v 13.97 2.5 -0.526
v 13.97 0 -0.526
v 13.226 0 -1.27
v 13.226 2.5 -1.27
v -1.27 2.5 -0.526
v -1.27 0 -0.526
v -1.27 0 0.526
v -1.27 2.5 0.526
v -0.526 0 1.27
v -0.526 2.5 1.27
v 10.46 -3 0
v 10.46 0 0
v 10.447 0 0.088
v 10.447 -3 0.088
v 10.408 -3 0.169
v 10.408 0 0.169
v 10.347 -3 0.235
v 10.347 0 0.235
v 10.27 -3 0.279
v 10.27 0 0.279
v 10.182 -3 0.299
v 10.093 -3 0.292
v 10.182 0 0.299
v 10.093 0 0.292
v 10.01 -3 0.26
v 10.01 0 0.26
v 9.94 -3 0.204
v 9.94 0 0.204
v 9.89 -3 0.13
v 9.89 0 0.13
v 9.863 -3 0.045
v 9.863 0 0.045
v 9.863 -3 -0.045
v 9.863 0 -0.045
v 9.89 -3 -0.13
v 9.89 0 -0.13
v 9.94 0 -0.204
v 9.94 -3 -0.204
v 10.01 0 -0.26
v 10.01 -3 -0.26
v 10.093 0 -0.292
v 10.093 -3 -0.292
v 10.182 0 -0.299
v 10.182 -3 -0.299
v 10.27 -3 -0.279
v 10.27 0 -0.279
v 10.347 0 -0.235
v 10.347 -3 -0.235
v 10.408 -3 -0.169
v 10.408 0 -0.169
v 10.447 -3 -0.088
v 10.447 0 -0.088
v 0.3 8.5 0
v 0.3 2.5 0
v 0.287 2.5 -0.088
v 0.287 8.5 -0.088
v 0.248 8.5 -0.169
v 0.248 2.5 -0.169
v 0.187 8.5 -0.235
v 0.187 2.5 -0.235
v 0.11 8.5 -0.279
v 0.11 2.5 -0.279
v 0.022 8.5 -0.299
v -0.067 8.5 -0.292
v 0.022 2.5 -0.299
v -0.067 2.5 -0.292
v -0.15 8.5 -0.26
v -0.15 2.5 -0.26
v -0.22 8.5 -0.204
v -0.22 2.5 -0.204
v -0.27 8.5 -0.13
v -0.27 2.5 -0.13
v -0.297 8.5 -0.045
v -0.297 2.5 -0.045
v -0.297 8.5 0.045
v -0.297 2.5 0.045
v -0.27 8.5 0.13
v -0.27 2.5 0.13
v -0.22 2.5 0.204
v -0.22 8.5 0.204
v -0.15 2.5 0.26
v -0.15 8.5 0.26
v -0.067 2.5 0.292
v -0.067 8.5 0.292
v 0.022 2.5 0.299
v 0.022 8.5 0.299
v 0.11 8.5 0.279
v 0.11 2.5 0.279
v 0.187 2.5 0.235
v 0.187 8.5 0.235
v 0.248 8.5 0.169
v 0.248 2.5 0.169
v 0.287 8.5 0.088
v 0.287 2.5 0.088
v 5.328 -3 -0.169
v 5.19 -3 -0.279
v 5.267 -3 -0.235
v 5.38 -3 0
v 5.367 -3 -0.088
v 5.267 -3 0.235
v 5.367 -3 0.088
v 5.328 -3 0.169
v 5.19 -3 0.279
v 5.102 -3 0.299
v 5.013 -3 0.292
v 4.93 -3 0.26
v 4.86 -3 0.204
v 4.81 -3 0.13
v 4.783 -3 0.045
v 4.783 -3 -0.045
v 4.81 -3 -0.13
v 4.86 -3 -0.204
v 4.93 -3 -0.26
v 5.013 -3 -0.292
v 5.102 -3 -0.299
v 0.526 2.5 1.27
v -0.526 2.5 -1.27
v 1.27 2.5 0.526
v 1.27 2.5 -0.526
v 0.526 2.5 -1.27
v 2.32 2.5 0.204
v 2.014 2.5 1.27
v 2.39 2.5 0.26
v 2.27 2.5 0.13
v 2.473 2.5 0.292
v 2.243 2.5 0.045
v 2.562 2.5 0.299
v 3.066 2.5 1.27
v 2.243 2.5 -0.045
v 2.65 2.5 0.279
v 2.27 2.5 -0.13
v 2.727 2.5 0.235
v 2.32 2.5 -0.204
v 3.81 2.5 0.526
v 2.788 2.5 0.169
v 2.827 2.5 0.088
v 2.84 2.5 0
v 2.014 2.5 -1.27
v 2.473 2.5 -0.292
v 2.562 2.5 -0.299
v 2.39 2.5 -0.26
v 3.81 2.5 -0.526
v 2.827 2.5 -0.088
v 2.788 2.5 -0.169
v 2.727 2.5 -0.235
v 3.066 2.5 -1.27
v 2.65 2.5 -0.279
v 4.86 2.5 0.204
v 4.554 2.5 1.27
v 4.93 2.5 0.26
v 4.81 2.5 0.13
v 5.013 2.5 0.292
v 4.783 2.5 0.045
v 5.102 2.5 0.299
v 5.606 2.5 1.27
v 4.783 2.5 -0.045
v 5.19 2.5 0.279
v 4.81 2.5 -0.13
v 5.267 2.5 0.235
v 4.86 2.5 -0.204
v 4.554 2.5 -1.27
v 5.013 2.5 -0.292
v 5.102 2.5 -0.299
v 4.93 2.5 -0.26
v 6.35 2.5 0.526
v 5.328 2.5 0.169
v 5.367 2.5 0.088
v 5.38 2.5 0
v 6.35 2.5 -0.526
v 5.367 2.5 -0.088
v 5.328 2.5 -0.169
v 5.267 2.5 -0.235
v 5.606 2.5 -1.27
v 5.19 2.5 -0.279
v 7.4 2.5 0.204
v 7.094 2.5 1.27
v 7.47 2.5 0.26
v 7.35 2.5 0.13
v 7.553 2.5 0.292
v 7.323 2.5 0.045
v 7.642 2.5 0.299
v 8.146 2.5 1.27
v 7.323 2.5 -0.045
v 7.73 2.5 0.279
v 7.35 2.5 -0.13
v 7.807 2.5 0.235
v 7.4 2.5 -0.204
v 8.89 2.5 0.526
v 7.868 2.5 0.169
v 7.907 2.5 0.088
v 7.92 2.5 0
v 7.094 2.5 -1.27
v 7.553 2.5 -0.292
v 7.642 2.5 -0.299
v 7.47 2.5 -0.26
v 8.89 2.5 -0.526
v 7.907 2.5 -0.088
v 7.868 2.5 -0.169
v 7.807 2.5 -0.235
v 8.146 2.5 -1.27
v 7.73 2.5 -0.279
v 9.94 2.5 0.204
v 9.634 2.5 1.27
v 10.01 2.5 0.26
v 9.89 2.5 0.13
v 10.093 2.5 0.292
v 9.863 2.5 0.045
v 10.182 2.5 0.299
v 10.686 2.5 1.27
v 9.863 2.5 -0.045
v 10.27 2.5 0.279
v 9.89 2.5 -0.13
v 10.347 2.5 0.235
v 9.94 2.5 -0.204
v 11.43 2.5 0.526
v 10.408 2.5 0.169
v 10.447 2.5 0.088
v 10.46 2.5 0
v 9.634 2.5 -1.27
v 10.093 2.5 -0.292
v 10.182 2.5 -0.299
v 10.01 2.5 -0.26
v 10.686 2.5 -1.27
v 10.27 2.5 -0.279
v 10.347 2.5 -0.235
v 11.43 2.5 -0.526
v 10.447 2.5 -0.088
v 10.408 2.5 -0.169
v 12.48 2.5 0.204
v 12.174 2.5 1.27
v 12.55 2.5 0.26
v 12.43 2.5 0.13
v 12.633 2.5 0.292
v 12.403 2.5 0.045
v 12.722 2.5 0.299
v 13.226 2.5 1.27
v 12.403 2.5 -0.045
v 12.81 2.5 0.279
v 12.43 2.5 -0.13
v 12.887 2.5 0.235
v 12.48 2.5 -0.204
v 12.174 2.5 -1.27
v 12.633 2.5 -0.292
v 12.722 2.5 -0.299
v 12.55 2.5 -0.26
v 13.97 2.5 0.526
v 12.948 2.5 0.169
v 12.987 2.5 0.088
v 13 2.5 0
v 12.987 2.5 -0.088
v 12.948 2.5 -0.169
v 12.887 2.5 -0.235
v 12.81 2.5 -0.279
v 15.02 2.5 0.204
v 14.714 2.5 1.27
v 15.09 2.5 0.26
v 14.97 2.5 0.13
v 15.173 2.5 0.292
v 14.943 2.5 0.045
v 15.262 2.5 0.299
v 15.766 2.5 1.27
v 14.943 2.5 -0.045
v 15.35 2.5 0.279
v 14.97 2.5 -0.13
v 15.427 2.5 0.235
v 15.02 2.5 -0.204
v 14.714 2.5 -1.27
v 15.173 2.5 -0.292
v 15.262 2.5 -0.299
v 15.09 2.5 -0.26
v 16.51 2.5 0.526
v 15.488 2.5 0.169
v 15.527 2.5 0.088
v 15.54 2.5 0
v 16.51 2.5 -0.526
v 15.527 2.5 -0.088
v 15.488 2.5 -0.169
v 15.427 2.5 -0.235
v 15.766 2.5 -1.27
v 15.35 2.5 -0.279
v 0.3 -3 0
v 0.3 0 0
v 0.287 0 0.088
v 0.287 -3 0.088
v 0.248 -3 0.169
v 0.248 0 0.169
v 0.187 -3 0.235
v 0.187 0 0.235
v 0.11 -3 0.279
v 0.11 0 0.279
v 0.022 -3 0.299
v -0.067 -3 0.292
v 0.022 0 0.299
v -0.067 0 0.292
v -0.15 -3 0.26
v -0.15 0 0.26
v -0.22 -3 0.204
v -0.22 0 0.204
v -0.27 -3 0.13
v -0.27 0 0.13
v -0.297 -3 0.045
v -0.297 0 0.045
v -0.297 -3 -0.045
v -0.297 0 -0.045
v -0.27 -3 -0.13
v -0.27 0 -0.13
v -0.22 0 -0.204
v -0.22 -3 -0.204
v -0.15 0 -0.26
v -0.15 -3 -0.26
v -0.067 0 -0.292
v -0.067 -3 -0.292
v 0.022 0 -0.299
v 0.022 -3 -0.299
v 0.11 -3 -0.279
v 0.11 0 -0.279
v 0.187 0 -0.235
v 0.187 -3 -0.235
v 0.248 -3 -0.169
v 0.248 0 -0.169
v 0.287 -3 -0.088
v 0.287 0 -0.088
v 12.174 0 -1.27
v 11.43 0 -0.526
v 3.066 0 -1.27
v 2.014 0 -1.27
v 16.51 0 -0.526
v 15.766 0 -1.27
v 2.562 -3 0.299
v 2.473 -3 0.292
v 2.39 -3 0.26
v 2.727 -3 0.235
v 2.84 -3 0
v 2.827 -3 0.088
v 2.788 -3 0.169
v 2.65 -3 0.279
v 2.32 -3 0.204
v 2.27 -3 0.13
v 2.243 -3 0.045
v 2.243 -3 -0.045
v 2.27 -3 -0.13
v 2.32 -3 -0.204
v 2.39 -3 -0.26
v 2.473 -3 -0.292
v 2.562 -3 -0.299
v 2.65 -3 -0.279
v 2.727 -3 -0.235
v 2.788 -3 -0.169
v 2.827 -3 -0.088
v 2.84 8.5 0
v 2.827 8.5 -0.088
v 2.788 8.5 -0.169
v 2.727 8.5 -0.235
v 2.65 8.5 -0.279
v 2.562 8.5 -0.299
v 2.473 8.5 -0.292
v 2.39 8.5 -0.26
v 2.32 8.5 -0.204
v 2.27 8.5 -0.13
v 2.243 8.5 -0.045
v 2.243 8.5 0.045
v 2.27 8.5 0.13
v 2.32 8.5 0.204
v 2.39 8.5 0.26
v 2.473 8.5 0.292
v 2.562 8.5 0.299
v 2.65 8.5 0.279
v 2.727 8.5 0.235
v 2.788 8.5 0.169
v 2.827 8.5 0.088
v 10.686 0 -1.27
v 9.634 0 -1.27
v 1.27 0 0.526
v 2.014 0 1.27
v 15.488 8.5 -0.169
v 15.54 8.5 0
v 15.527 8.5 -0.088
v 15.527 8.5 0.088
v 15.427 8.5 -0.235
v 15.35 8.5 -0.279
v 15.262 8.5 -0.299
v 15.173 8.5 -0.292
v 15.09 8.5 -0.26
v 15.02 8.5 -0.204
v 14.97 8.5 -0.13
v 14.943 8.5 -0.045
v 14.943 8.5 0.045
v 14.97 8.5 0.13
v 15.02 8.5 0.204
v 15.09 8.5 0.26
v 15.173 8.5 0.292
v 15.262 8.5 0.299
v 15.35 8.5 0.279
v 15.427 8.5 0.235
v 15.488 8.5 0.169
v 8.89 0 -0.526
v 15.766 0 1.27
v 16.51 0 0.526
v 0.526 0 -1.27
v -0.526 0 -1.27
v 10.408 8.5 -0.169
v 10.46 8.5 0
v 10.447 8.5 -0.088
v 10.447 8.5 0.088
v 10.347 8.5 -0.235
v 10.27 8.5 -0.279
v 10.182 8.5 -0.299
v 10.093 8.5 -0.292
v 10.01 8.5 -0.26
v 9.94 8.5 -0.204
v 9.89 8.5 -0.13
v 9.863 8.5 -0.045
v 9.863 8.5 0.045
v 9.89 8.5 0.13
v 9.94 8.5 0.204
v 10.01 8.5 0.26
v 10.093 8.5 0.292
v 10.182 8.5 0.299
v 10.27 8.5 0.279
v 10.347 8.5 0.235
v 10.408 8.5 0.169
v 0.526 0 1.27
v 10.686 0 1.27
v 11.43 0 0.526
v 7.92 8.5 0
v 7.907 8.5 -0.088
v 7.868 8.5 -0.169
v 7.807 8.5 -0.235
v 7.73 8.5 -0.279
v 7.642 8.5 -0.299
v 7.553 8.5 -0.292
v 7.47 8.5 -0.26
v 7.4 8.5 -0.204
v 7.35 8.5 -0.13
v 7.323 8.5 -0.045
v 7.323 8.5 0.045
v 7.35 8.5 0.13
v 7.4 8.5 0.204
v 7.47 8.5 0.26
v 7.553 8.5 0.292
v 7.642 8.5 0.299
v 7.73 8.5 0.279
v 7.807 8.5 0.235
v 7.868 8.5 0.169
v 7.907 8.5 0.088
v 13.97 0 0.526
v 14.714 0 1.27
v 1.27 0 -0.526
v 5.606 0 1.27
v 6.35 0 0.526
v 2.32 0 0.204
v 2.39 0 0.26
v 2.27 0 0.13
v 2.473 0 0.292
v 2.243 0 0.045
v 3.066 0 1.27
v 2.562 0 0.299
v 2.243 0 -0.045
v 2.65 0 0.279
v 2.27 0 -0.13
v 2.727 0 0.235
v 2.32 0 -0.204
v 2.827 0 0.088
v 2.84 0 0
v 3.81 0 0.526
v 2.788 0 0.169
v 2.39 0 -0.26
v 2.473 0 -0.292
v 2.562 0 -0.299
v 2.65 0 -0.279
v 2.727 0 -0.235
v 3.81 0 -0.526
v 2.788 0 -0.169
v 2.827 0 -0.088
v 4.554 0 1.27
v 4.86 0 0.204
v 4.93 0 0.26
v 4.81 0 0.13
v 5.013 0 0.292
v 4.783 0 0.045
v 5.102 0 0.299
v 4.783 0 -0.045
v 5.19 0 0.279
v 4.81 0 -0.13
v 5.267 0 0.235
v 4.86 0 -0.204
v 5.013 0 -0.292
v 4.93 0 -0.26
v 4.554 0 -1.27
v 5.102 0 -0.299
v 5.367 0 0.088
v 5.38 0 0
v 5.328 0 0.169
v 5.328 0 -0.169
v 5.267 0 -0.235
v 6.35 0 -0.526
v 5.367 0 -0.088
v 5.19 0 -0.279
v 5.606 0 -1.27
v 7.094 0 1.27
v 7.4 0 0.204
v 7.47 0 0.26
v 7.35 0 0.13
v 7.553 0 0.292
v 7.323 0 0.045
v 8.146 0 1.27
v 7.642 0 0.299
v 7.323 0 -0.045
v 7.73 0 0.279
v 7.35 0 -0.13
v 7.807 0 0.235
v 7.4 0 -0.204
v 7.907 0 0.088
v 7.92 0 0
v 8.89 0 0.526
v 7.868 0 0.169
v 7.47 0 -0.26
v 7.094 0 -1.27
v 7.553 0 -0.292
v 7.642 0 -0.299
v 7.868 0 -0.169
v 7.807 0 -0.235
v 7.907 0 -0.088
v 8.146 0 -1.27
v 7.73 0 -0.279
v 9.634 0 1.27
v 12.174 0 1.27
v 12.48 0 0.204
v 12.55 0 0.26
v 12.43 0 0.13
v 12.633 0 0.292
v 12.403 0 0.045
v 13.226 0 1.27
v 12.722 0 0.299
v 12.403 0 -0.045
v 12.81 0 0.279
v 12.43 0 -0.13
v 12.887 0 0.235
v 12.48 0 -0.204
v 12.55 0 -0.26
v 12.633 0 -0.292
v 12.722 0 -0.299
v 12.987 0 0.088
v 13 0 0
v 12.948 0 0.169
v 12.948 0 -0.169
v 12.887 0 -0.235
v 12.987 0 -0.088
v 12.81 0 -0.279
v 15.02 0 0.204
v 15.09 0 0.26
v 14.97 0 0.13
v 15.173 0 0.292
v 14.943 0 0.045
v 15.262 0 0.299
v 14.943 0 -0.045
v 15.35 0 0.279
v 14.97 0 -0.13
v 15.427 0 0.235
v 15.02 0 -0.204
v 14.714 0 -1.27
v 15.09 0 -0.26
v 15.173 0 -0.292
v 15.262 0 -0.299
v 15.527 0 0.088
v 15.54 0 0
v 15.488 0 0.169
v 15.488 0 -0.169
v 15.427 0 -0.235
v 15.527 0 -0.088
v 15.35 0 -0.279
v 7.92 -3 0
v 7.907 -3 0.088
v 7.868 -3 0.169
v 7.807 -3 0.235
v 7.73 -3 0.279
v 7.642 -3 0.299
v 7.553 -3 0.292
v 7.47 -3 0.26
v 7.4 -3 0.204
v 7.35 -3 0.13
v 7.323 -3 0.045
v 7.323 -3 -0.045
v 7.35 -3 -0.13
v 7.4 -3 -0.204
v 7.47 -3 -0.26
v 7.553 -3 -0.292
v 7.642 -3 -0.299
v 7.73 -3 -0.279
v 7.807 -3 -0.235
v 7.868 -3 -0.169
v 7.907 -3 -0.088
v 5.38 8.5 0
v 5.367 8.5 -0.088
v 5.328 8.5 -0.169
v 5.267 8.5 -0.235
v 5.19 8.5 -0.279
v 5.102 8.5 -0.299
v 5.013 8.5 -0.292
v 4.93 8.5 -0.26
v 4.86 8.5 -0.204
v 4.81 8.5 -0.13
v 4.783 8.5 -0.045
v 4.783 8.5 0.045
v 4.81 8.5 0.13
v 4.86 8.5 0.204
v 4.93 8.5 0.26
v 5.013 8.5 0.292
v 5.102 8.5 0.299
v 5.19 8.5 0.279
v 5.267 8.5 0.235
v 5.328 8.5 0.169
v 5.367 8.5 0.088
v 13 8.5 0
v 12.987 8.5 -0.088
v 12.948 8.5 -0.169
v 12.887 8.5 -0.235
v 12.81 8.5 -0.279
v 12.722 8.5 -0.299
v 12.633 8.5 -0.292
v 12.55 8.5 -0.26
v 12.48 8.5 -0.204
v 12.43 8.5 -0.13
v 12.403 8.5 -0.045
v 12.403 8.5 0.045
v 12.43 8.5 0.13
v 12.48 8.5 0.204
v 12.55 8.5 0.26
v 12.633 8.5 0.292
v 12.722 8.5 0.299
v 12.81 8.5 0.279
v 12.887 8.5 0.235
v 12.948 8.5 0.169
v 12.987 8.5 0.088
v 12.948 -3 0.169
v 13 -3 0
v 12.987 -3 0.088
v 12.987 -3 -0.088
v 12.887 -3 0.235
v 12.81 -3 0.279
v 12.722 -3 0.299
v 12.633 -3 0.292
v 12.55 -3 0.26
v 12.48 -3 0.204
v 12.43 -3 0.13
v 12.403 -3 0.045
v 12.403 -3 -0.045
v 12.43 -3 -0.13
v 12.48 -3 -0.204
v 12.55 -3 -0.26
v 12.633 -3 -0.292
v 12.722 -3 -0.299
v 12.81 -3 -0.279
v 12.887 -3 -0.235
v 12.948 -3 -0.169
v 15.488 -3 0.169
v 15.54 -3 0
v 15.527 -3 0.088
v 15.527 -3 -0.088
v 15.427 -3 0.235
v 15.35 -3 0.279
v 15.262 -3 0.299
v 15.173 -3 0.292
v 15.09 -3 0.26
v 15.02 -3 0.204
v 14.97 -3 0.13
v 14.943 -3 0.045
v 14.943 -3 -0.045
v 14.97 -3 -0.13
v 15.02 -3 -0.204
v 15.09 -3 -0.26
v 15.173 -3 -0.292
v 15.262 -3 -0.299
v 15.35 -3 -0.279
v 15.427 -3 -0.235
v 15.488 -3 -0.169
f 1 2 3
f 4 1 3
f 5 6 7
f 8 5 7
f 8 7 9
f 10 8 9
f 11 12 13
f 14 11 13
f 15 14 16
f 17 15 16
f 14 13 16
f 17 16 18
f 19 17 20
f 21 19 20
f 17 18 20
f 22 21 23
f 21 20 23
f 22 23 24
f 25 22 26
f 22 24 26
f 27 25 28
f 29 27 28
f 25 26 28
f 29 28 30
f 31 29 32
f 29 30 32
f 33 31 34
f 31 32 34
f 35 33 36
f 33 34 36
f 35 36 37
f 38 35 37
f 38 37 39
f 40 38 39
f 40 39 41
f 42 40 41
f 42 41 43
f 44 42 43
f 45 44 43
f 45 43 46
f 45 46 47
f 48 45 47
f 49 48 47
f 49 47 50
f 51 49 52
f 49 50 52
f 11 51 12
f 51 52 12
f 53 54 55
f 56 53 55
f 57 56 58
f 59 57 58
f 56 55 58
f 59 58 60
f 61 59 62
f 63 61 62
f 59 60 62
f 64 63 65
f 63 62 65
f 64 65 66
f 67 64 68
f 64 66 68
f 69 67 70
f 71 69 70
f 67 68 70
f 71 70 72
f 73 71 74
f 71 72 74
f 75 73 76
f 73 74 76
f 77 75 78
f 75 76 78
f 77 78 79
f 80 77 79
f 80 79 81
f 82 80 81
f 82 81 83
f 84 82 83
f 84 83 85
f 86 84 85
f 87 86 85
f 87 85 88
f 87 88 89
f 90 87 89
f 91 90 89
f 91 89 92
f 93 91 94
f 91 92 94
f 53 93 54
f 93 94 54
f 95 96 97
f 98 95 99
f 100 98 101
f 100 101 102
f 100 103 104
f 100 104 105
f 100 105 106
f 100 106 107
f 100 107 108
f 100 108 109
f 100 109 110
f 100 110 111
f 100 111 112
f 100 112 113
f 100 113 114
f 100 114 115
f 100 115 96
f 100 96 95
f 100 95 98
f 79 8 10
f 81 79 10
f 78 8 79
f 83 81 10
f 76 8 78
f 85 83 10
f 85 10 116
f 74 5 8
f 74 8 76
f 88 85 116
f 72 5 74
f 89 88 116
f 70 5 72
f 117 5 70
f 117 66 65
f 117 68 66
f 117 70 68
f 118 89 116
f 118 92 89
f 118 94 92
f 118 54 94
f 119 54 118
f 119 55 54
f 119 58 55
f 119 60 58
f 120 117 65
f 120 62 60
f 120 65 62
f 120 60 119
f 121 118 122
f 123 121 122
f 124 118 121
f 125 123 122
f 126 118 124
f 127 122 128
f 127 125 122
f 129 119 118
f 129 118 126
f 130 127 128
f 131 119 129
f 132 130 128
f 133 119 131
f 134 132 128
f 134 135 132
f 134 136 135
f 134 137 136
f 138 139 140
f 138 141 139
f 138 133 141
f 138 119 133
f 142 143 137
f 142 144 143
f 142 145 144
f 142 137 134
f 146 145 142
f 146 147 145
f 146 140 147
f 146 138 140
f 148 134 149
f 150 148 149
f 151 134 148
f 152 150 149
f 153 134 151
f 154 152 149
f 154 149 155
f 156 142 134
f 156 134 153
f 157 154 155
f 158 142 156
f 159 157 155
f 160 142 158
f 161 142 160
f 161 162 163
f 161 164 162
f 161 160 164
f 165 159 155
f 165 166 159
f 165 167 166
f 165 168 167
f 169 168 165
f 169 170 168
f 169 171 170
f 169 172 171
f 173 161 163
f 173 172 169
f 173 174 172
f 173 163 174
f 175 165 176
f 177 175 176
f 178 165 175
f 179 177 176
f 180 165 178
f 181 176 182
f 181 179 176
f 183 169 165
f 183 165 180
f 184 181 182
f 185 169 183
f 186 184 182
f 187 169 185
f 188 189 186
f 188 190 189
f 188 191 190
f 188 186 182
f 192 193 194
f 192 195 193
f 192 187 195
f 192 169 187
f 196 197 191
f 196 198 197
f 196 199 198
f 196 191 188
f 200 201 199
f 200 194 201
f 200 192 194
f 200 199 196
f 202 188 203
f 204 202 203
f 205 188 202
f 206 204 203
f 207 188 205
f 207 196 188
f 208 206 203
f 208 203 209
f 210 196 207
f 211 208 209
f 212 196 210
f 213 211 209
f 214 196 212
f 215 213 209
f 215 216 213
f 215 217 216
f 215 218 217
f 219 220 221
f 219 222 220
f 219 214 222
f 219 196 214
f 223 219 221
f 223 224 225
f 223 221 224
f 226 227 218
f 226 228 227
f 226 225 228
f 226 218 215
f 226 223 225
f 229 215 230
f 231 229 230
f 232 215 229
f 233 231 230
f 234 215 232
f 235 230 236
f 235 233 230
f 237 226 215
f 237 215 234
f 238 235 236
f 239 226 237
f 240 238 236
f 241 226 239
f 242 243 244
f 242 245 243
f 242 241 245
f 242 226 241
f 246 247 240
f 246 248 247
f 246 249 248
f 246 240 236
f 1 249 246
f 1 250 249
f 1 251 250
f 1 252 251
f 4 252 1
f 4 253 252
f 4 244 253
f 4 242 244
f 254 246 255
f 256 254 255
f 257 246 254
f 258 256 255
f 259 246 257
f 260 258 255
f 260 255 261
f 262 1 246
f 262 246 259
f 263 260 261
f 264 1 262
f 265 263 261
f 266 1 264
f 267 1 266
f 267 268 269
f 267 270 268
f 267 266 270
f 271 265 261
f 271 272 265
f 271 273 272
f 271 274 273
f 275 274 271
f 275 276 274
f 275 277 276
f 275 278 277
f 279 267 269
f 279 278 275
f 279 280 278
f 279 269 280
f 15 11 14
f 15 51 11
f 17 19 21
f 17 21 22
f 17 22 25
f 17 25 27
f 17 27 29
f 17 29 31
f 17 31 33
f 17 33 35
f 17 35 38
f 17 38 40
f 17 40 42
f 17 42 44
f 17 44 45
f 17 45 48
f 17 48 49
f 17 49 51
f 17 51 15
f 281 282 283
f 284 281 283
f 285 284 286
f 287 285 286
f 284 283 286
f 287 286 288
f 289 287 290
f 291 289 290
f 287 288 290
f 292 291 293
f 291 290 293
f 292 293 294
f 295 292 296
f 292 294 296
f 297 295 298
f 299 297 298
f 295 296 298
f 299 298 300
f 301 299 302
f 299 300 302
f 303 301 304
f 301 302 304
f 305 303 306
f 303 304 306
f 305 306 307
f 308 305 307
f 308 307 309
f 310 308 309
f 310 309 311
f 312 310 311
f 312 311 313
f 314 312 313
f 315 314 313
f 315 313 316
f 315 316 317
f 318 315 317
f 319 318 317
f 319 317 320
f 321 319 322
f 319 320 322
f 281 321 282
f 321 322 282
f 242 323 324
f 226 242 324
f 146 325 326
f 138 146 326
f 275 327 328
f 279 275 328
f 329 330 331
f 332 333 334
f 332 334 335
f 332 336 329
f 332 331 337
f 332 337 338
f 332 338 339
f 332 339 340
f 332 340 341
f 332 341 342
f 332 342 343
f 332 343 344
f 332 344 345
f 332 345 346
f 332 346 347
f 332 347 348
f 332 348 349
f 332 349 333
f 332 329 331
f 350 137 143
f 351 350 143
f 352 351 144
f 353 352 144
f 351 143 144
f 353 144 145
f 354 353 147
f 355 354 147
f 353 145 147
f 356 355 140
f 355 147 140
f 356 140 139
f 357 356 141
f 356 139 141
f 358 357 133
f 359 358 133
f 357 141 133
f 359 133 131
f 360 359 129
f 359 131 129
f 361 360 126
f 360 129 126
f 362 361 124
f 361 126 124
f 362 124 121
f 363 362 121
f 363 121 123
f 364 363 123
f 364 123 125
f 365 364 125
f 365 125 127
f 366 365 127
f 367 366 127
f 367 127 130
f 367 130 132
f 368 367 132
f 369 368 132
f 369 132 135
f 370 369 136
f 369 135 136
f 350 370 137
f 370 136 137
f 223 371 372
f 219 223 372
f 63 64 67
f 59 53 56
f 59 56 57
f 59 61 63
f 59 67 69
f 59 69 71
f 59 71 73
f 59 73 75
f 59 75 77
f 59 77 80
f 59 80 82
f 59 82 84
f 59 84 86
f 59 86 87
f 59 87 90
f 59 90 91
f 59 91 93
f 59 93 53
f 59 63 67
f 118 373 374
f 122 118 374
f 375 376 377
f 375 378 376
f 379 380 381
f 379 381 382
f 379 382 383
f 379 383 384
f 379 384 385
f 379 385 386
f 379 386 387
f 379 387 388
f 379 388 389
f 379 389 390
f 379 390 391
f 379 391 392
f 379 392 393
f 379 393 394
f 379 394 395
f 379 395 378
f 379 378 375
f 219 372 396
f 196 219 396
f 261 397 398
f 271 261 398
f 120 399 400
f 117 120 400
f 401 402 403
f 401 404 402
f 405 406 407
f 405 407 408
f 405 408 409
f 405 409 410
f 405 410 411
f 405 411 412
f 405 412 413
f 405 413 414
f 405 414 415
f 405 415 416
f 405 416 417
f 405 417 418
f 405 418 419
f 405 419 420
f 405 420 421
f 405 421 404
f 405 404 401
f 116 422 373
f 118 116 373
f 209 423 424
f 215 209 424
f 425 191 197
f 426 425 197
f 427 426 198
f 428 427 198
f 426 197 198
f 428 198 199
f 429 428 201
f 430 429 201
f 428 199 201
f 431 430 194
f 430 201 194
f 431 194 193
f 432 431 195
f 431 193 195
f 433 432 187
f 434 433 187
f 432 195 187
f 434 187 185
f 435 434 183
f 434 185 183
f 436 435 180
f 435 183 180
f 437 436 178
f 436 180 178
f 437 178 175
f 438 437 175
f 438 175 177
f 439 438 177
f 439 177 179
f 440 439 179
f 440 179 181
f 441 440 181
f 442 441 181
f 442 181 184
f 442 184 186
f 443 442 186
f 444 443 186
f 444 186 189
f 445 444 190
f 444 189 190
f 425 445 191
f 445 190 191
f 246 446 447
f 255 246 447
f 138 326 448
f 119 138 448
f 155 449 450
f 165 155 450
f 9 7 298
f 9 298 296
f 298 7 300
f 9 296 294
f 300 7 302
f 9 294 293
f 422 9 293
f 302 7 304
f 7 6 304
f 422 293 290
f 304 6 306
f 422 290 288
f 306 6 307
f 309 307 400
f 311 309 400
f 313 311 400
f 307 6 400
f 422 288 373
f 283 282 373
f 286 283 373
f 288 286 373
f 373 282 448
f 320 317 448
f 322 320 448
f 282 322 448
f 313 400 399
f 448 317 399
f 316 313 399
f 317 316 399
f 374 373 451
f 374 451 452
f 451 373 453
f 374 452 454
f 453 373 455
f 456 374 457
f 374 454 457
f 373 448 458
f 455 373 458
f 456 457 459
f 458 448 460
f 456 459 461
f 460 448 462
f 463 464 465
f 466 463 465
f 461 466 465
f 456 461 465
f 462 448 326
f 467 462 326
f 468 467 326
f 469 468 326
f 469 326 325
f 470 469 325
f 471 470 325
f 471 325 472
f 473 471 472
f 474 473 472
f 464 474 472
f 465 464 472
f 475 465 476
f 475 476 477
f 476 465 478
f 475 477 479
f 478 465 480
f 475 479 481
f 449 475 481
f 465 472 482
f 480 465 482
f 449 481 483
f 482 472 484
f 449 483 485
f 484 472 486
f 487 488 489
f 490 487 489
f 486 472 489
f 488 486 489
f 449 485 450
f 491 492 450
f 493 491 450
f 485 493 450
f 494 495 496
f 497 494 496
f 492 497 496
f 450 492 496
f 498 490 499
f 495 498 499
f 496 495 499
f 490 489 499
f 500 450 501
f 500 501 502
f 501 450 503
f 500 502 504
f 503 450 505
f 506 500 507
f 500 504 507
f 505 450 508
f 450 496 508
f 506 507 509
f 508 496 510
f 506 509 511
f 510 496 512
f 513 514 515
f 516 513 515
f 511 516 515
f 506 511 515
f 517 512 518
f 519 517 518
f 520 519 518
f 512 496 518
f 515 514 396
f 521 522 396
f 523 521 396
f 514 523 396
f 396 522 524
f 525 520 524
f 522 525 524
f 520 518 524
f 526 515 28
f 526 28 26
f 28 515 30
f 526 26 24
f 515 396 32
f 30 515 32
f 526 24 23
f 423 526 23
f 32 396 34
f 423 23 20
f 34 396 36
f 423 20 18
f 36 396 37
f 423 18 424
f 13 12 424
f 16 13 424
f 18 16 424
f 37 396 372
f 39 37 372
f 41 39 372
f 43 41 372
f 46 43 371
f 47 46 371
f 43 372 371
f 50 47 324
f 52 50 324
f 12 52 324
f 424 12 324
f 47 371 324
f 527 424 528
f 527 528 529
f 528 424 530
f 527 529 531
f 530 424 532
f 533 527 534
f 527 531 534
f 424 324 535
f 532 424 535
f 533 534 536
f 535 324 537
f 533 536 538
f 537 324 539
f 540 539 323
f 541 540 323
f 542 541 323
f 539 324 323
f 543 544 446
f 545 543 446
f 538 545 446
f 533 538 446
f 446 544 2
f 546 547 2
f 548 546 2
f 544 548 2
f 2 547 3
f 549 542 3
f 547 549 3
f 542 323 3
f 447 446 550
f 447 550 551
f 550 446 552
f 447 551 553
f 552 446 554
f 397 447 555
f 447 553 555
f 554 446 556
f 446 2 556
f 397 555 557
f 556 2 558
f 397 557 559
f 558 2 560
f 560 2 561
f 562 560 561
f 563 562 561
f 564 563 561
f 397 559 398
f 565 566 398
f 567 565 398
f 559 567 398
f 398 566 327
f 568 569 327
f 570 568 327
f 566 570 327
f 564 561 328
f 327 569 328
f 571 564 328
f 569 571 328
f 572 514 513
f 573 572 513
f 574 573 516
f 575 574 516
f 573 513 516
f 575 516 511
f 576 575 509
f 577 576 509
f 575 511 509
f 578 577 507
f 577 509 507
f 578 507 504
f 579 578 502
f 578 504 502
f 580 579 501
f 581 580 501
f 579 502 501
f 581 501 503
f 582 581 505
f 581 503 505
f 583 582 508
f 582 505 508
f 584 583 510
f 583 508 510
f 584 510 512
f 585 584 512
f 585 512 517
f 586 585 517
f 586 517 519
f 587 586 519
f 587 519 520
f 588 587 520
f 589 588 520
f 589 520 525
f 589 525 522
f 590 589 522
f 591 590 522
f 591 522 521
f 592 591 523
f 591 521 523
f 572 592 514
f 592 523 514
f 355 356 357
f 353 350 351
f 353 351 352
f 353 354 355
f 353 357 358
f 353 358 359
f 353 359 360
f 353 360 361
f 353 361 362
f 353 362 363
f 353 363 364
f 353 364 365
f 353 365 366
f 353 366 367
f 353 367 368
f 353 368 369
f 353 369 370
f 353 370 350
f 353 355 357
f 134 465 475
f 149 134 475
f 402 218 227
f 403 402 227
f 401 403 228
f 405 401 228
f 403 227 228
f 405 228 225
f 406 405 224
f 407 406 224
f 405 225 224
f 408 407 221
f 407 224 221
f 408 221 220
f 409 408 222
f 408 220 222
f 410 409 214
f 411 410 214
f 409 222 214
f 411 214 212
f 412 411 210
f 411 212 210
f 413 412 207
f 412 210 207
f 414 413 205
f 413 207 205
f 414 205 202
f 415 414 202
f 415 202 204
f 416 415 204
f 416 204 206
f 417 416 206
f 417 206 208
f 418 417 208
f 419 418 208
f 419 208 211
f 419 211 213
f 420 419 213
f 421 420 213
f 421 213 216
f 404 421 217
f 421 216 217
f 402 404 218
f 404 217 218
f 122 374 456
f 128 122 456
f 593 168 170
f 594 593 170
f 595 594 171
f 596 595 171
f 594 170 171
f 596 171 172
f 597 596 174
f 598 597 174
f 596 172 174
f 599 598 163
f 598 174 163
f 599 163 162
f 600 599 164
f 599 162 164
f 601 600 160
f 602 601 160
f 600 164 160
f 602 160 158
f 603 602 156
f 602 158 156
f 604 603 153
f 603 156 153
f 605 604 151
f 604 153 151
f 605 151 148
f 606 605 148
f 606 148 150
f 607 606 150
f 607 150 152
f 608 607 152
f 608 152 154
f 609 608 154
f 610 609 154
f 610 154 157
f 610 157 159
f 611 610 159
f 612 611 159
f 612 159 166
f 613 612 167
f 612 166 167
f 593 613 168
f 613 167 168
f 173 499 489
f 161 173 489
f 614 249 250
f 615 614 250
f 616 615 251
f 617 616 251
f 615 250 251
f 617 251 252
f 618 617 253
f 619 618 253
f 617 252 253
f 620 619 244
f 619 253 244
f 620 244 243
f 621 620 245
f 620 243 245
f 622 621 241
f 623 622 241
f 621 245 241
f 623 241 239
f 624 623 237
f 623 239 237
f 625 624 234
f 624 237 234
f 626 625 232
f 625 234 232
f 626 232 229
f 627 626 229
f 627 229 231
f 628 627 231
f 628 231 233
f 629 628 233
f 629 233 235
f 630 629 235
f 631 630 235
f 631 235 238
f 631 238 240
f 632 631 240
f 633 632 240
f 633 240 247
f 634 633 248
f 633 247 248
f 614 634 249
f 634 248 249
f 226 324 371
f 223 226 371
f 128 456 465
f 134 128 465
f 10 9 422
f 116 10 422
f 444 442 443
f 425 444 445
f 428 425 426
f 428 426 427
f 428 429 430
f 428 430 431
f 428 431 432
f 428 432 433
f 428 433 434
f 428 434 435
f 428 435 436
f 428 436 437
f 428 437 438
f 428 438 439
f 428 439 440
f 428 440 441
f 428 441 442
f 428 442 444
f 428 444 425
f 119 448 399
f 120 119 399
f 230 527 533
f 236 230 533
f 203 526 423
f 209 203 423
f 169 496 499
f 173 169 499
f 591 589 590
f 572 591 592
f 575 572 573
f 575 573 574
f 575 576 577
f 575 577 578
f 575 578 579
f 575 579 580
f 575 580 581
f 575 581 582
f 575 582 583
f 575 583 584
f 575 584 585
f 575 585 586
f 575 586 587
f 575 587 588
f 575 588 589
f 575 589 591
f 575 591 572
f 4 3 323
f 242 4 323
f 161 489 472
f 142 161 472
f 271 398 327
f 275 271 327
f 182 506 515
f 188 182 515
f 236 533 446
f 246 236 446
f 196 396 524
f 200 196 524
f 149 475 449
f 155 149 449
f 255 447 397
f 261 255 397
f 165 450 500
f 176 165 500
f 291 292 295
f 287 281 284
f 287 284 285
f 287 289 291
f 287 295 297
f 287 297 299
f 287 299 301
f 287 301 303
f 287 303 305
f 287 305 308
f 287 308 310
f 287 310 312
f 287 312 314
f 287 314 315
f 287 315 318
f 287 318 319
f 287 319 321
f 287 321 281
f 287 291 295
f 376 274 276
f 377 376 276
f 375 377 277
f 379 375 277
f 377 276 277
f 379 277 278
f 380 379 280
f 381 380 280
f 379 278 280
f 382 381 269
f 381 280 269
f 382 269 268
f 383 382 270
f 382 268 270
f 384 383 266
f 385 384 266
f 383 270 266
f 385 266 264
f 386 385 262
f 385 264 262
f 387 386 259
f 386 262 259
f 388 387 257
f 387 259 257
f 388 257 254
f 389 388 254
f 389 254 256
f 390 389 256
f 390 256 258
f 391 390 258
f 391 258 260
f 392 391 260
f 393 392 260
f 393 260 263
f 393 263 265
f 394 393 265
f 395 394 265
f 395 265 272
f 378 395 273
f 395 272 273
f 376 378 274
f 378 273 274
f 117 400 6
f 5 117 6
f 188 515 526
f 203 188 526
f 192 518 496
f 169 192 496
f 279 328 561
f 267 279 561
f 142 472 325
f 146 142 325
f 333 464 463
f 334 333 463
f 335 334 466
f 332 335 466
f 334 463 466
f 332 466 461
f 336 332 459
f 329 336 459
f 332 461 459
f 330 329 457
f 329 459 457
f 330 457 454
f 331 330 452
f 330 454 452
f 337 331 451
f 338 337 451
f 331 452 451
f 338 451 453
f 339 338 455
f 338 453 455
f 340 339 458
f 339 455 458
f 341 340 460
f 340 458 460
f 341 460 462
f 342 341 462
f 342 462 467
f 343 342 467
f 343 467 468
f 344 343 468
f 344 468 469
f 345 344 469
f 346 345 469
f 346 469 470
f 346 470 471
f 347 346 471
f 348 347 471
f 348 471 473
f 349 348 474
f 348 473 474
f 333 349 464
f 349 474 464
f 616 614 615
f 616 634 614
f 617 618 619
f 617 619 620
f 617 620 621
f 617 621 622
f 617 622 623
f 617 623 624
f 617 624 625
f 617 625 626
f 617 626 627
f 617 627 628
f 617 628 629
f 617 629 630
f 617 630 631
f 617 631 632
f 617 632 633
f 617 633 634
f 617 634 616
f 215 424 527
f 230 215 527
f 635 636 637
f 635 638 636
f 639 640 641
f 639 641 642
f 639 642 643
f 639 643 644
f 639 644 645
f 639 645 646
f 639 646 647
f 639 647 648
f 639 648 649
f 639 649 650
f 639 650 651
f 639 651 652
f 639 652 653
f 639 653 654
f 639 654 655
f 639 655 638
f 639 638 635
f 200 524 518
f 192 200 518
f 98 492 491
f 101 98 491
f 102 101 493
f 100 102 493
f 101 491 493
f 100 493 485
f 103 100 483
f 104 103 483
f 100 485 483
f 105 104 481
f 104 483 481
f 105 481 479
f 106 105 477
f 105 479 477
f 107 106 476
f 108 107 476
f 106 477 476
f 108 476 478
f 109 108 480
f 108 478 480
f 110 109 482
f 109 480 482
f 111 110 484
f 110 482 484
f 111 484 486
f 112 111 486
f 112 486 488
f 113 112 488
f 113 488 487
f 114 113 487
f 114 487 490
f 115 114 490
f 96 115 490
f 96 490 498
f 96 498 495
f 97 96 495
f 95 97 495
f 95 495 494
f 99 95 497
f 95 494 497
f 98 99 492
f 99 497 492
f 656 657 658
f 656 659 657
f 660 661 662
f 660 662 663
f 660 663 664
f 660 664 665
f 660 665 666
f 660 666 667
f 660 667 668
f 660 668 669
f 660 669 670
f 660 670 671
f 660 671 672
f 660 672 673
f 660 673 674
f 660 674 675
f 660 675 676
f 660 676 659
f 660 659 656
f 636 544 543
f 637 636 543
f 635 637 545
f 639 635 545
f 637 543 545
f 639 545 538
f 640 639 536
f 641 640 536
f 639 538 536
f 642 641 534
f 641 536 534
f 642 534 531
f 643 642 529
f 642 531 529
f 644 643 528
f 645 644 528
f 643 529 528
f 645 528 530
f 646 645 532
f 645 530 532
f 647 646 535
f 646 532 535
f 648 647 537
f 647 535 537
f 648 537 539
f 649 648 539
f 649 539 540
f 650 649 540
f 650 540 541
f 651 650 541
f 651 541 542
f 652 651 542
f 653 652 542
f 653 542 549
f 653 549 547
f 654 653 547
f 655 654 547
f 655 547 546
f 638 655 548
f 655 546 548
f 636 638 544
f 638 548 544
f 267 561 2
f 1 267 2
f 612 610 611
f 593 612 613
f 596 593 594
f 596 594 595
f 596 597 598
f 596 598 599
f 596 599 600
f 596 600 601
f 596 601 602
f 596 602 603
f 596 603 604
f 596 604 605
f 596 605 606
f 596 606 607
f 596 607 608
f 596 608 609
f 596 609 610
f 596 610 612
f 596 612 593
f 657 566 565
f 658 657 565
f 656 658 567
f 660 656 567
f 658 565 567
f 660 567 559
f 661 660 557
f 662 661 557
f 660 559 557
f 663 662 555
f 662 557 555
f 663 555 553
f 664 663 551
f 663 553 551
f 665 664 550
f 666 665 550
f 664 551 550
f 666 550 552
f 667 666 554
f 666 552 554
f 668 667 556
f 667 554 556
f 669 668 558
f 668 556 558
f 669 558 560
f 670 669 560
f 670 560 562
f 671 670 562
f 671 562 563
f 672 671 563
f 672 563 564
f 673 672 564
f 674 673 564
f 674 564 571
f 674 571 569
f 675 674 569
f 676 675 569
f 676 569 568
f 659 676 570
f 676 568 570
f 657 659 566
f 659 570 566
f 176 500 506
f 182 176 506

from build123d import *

# Parameters (mm, degrees)
EXTRUDE_1_DEPTH = 2.5
SKETCH_2_R      = 0.3
EXTRUDE_2_DEPTH = 6
SKETCH_3_R      = 0.3
EXTRUDE_3_DEPTH = 3


with BuildPart() as part:
    # Эскиз1 → Бобышка-Вытянуть1 (new body)
    with BuildSketch(Plane(origin=(0, 0, 0), x_dir=(1, 0, 0), z_dir=(0, 1, 0))):
        Polygon((16.51, -0.526051224), (16.51, 0.526051224), (15.766051224, 1.27), (14.713948776, 1.27), (13.97, 0.526051224), (13.226051224, 1.27), (12.173948776, 1.27), (11.43, 0.526051224), (10.686051224, 1.27), (9.633948776, 1.27), (8.89, 0.526051224), (8.146051224, 1.27), (7.093948776, 1.27), (6.35, 0.526051224), (5.606051224, 1.27), (4.553948776, 1.27), (3.81, 0.526051224), (3.066051224, 1.27), (2.013948776, 1.27), (1.27, 0.526051224), (0.526051224, 1.27), (-0.526051224, 1.27), (-1.27, 0.526051224), (-1.27, -0.526051224), (-0.526051224, -1.27), (0.526051224, -1.27), (1.27, -0.526051224), (2.013948776, -1.27), (3.066051224, -1.27), (3.81, -0.526051224), (4.553948776, -1.27), (5.606051224, -1.27), (6.35, -0.526051224), (7.093948776, -1.27), (8.146051224, -1.27), (8.89, -0.526051224), (9.633948776, -1.27), (10.686051224, -1.27), (11.43, -0.526051224), (12.173948776, -1.27), (13.226051224, -1.27), (13.97, -0.526051224), (14.713948776, -1.27), (15.766051224, -1.27), align=None)
    extrude(amount=EXTRUDE_1_DEPTH)

    # Эскиз2 → Бобышка-Вытянуть2 (add)
    with BuildSketch(Plane(origin=(0, 2.5, 0), x_dir=(1, 0, 0), z_dir=(0, 1, 0))):
        Circle(SKETCH_2_R)
        with Locations((2.54, 0)):
            Circle(SKETCH_2_R)
        with Locations((5.08, 0)):
            Circle(SKETCH_2_R)
        with Locations((7.62, 0)):
            Circle(SKETCH_2_R)
        with Locations((10.16, 0)):
            Circle(SKETCH_2_R)
        with Locations((12.7, 0)):
            Circle(SKETCH_2_R)
        with Locations((15.24, 0)):
            Circle(SKETCH_2_R)
    extrude(amount=EXTRUDE_2_DEPTH)

    # Эскиз3 → Бобышка-Вытянуть3 (add)
    with BuildSketch(Plane.XZ):
        Circle(SKETCH_3_R)
        with Locations((2.54, 0)):
            Circle(SKETCH_3_R)
        with Locations((5.08, 0)):
            Circle(SKETCH_3_R)
        with Locations((7.62, 0)):
            Circle(SKETCH_3_R)
        with Locations((10.16, 0)):
            Circle(SKETCH_3_R)
        with Locations((12.7, 0)):
            Circle(SKETCH_3_R)
        with Locations((15.24, 0)):
            Circle(SKETCH_3_R)
    extrude(amount=EXTRUDE_3_DEPTH)


solid = part.part
